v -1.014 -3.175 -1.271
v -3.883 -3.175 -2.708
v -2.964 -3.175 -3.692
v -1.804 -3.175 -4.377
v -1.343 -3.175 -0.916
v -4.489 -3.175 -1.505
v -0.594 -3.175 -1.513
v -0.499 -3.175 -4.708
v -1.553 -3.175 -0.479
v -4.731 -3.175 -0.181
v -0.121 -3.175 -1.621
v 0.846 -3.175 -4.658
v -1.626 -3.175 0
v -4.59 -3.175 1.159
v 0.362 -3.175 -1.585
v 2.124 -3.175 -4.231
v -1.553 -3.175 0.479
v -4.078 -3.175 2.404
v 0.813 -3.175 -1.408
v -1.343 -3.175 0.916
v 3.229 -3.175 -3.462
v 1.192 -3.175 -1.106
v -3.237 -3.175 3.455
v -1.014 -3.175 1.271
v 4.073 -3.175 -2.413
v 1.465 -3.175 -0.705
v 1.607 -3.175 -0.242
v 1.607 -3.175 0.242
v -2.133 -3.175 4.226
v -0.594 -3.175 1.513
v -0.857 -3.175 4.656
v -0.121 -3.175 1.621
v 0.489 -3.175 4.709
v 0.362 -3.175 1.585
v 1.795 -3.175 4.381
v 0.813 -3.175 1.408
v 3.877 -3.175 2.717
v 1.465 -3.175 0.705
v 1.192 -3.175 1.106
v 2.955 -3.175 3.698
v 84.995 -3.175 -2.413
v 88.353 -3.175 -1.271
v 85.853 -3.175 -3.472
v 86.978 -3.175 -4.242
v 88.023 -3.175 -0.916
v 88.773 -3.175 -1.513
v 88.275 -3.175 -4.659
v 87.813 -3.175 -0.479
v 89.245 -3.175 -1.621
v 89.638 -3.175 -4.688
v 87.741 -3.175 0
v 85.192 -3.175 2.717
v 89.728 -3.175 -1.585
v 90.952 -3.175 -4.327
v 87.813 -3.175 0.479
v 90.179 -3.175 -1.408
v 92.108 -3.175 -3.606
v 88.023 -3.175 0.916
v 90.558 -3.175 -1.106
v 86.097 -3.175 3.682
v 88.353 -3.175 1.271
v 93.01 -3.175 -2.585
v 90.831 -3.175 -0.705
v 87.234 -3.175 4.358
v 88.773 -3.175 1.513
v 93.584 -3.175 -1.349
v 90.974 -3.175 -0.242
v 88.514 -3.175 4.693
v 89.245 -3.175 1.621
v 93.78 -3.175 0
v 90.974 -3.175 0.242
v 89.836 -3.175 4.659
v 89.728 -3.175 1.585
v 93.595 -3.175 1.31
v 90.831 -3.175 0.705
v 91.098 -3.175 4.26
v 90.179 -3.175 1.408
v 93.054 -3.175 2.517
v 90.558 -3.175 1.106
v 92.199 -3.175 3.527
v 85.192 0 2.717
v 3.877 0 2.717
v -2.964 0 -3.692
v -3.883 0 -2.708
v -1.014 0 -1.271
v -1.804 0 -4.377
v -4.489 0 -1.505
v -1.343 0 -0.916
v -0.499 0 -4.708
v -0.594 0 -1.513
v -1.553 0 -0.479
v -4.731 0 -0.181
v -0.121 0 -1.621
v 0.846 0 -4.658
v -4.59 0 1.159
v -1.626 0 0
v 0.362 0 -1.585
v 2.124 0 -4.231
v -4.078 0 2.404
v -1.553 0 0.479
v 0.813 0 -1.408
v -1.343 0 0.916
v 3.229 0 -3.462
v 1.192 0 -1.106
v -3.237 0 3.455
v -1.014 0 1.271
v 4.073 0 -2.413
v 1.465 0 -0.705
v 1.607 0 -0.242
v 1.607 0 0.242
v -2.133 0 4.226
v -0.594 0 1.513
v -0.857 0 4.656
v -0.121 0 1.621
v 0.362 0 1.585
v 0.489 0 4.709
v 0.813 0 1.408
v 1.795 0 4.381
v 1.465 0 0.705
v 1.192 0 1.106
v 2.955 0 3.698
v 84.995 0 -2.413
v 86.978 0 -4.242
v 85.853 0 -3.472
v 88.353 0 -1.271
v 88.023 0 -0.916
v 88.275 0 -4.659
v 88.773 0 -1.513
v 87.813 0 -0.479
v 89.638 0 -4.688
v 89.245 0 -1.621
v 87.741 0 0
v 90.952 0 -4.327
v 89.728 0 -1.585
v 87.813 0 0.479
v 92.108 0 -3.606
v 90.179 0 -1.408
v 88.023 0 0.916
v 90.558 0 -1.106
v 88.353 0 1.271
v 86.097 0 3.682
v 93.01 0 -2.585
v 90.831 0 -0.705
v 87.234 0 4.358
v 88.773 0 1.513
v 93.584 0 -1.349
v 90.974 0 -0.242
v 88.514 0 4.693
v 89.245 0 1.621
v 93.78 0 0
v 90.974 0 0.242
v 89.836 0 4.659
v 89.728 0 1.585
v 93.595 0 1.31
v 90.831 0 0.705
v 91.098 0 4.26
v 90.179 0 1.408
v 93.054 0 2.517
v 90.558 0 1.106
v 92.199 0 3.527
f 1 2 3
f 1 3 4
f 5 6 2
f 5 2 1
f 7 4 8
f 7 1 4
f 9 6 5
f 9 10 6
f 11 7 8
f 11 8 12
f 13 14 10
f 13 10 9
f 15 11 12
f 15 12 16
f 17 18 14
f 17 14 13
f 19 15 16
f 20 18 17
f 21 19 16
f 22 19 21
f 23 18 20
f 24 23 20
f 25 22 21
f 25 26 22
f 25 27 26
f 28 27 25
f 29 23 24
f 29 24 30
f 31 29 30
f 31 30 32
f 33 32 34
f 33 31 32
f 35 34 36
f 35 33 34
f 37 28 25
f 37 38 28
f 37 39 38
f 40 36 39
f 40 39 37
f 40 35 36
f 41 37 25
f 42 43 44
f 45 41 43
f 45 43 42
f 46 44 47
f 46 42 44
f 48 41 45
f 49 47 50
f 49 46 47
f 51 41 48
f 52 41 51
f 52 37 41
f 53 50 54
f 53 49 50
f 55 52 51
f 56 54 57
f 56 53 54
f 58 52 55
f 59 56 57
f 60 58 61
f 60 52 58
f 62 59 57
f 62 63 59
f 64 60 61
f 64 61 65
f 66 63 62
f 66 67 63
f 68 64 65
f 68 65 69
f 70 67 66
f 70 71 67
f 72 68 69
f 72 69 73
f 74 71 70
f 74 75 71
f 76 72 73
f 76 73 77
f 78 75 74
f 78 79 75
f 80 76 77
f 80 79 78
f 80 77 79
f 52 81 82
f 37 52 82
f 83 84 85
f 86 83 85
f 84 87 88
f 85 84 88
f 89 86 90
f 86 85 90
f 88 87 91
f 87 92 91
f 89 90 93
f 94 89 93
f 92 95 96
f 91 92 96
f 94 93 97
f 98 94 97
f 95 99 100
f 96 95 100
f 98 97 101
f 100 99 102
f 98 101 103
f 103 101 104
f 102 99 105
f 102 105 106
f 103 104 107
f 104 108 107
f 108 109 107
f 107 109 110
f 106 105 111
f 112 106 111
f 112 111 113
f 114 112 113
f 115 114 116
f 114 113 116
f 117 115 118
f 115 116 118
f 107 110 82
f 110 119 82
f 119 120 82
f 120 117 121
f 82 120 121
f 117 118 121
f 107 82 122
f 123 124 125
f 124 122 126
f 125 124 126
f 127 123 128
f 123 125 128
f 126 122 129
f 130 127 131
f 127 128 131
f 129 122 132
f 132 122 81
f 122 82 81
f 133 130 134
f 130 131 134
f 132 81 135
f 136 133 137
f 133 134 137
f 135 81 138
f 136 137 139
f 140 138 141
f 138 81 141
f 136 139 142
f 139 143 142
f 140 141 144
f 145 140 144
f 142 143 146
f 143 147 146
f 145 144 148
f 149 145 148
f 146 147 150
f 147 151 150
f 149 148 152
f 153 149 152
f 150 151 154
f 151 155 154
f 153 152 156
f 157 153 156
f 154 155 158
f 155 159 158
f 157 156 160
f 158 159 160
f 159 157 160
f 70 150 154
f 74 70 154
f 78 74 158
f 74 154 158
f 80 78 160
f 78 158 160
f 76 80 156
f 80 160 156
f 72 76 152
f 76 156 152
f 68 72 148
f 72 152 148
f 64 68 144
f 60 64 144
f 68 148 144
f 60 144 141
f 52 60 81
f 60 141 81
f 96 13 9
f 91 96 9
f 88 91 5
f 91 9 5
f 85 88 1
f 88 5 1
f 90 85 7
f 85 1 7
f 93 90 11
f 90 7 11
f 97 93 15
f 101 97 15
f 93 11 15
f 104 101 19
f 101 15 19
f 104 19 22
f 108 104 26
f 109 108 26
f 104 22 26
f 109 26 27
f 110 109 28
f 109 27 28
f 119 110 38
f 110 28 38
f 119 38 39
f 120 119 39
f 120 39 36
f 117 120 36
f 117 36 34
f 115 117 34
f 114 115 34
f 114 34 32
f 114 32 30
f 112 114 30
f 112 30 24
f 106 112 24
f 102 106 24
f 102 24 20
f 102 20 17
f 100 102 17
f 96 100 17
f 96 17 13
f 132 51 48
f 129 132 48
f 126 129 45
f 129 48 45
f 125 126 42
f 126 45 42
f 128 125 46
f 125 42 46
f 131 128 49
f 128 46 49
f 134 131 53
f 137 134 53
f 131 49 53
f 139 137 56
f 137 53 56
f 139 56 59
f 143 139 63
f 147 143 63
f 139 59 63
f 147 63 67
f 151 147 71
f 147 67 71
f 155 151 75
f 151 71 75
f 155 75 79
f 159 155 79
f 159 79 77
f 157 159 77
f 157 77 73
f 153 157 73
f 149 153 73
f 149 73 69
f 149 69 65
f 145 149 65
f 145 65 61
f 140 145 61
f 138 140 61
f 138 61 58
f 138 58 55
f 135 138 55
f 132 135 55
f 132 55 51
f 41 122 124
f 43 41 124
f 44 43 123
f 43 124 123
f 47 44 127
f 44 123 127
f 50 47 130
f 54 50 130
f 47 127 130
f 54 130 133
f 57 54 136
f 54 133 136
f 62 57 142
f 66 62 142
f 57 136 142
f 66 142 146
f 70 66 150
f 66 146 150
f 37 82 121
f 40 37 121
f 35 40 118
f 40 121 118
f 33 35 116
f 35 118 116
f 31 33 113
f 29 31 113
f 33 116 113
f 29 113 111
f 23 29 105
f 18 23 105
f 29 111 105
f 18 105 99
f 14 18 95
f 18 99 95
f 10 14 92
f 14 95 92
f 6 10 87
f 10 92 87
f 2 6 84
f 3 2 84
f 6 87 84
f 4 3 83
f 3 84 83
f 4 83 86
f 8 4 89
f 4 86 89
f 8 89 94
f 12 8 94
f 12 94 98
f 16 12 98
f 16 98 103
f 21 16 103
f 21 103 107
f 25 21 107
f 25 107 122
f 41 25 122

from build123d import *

# Parameters (mm, degrees)
F1_DEPTH = 3.175
F3_D     = 3.2512


with BuildPart() as f1:
    # F0 (on Front) → F1 (new body)
    with BuildSketch(Plane.XZ):
        with BuildLine():
            ThreePointArc((4.073034, -2.413141), (4.565934, -1.251041), (4.734222, 0))
            ThreePointArc((4.734222, 0), (4.514878, 1.424338), (3.87717, 2.716692))
            ThreePointArc((3.87717, 2.716692), (-4.730775, -0.180628), (4.073034, -2.413141))
        make_face()
        with BuildLine():
            ThreePointArc((3.87717, 2.716692), (4.514878, 1.424338), (4.734222, 0))
            ThreePointArc((4.734222, 0), (4.565934, -1.251041), (4.073034, -2.413141))
            Line((4.073034, -2.413141), (84.995226, -2.413141))
            ThreePointArc((84.995226, -2.413141), (84.335839, 0.180791), (85.191691, 2.716692))
            Line((85.191691, 2.716692), (3.87717, 2.716692))
        make_face()
        with BuildLine():
            ThreePointArc((93.780427, 0), (90.481081, 4.504076), (85.191691, 2.716692))
            ThreePointArc((85.191691, 2.716692), (84.335839, 0.180791), (84.995226, -2.413141))
            ThreePointArc((84.995226, -2.413141), (90.307663, -4.555299), (93.780427, 0))
        make_face()
    extrude(amount=F1_DEPTH)

    # F3 (through all)
    with Locations(Plane(origin=(0, 0, 0), x_dir=(1, 0, 0), z_dir=(0, 1, 0))):
        with Locations((0, 0), (89.366406, 0)):
            Hole(F3_D / 2)


solid = f1.part
